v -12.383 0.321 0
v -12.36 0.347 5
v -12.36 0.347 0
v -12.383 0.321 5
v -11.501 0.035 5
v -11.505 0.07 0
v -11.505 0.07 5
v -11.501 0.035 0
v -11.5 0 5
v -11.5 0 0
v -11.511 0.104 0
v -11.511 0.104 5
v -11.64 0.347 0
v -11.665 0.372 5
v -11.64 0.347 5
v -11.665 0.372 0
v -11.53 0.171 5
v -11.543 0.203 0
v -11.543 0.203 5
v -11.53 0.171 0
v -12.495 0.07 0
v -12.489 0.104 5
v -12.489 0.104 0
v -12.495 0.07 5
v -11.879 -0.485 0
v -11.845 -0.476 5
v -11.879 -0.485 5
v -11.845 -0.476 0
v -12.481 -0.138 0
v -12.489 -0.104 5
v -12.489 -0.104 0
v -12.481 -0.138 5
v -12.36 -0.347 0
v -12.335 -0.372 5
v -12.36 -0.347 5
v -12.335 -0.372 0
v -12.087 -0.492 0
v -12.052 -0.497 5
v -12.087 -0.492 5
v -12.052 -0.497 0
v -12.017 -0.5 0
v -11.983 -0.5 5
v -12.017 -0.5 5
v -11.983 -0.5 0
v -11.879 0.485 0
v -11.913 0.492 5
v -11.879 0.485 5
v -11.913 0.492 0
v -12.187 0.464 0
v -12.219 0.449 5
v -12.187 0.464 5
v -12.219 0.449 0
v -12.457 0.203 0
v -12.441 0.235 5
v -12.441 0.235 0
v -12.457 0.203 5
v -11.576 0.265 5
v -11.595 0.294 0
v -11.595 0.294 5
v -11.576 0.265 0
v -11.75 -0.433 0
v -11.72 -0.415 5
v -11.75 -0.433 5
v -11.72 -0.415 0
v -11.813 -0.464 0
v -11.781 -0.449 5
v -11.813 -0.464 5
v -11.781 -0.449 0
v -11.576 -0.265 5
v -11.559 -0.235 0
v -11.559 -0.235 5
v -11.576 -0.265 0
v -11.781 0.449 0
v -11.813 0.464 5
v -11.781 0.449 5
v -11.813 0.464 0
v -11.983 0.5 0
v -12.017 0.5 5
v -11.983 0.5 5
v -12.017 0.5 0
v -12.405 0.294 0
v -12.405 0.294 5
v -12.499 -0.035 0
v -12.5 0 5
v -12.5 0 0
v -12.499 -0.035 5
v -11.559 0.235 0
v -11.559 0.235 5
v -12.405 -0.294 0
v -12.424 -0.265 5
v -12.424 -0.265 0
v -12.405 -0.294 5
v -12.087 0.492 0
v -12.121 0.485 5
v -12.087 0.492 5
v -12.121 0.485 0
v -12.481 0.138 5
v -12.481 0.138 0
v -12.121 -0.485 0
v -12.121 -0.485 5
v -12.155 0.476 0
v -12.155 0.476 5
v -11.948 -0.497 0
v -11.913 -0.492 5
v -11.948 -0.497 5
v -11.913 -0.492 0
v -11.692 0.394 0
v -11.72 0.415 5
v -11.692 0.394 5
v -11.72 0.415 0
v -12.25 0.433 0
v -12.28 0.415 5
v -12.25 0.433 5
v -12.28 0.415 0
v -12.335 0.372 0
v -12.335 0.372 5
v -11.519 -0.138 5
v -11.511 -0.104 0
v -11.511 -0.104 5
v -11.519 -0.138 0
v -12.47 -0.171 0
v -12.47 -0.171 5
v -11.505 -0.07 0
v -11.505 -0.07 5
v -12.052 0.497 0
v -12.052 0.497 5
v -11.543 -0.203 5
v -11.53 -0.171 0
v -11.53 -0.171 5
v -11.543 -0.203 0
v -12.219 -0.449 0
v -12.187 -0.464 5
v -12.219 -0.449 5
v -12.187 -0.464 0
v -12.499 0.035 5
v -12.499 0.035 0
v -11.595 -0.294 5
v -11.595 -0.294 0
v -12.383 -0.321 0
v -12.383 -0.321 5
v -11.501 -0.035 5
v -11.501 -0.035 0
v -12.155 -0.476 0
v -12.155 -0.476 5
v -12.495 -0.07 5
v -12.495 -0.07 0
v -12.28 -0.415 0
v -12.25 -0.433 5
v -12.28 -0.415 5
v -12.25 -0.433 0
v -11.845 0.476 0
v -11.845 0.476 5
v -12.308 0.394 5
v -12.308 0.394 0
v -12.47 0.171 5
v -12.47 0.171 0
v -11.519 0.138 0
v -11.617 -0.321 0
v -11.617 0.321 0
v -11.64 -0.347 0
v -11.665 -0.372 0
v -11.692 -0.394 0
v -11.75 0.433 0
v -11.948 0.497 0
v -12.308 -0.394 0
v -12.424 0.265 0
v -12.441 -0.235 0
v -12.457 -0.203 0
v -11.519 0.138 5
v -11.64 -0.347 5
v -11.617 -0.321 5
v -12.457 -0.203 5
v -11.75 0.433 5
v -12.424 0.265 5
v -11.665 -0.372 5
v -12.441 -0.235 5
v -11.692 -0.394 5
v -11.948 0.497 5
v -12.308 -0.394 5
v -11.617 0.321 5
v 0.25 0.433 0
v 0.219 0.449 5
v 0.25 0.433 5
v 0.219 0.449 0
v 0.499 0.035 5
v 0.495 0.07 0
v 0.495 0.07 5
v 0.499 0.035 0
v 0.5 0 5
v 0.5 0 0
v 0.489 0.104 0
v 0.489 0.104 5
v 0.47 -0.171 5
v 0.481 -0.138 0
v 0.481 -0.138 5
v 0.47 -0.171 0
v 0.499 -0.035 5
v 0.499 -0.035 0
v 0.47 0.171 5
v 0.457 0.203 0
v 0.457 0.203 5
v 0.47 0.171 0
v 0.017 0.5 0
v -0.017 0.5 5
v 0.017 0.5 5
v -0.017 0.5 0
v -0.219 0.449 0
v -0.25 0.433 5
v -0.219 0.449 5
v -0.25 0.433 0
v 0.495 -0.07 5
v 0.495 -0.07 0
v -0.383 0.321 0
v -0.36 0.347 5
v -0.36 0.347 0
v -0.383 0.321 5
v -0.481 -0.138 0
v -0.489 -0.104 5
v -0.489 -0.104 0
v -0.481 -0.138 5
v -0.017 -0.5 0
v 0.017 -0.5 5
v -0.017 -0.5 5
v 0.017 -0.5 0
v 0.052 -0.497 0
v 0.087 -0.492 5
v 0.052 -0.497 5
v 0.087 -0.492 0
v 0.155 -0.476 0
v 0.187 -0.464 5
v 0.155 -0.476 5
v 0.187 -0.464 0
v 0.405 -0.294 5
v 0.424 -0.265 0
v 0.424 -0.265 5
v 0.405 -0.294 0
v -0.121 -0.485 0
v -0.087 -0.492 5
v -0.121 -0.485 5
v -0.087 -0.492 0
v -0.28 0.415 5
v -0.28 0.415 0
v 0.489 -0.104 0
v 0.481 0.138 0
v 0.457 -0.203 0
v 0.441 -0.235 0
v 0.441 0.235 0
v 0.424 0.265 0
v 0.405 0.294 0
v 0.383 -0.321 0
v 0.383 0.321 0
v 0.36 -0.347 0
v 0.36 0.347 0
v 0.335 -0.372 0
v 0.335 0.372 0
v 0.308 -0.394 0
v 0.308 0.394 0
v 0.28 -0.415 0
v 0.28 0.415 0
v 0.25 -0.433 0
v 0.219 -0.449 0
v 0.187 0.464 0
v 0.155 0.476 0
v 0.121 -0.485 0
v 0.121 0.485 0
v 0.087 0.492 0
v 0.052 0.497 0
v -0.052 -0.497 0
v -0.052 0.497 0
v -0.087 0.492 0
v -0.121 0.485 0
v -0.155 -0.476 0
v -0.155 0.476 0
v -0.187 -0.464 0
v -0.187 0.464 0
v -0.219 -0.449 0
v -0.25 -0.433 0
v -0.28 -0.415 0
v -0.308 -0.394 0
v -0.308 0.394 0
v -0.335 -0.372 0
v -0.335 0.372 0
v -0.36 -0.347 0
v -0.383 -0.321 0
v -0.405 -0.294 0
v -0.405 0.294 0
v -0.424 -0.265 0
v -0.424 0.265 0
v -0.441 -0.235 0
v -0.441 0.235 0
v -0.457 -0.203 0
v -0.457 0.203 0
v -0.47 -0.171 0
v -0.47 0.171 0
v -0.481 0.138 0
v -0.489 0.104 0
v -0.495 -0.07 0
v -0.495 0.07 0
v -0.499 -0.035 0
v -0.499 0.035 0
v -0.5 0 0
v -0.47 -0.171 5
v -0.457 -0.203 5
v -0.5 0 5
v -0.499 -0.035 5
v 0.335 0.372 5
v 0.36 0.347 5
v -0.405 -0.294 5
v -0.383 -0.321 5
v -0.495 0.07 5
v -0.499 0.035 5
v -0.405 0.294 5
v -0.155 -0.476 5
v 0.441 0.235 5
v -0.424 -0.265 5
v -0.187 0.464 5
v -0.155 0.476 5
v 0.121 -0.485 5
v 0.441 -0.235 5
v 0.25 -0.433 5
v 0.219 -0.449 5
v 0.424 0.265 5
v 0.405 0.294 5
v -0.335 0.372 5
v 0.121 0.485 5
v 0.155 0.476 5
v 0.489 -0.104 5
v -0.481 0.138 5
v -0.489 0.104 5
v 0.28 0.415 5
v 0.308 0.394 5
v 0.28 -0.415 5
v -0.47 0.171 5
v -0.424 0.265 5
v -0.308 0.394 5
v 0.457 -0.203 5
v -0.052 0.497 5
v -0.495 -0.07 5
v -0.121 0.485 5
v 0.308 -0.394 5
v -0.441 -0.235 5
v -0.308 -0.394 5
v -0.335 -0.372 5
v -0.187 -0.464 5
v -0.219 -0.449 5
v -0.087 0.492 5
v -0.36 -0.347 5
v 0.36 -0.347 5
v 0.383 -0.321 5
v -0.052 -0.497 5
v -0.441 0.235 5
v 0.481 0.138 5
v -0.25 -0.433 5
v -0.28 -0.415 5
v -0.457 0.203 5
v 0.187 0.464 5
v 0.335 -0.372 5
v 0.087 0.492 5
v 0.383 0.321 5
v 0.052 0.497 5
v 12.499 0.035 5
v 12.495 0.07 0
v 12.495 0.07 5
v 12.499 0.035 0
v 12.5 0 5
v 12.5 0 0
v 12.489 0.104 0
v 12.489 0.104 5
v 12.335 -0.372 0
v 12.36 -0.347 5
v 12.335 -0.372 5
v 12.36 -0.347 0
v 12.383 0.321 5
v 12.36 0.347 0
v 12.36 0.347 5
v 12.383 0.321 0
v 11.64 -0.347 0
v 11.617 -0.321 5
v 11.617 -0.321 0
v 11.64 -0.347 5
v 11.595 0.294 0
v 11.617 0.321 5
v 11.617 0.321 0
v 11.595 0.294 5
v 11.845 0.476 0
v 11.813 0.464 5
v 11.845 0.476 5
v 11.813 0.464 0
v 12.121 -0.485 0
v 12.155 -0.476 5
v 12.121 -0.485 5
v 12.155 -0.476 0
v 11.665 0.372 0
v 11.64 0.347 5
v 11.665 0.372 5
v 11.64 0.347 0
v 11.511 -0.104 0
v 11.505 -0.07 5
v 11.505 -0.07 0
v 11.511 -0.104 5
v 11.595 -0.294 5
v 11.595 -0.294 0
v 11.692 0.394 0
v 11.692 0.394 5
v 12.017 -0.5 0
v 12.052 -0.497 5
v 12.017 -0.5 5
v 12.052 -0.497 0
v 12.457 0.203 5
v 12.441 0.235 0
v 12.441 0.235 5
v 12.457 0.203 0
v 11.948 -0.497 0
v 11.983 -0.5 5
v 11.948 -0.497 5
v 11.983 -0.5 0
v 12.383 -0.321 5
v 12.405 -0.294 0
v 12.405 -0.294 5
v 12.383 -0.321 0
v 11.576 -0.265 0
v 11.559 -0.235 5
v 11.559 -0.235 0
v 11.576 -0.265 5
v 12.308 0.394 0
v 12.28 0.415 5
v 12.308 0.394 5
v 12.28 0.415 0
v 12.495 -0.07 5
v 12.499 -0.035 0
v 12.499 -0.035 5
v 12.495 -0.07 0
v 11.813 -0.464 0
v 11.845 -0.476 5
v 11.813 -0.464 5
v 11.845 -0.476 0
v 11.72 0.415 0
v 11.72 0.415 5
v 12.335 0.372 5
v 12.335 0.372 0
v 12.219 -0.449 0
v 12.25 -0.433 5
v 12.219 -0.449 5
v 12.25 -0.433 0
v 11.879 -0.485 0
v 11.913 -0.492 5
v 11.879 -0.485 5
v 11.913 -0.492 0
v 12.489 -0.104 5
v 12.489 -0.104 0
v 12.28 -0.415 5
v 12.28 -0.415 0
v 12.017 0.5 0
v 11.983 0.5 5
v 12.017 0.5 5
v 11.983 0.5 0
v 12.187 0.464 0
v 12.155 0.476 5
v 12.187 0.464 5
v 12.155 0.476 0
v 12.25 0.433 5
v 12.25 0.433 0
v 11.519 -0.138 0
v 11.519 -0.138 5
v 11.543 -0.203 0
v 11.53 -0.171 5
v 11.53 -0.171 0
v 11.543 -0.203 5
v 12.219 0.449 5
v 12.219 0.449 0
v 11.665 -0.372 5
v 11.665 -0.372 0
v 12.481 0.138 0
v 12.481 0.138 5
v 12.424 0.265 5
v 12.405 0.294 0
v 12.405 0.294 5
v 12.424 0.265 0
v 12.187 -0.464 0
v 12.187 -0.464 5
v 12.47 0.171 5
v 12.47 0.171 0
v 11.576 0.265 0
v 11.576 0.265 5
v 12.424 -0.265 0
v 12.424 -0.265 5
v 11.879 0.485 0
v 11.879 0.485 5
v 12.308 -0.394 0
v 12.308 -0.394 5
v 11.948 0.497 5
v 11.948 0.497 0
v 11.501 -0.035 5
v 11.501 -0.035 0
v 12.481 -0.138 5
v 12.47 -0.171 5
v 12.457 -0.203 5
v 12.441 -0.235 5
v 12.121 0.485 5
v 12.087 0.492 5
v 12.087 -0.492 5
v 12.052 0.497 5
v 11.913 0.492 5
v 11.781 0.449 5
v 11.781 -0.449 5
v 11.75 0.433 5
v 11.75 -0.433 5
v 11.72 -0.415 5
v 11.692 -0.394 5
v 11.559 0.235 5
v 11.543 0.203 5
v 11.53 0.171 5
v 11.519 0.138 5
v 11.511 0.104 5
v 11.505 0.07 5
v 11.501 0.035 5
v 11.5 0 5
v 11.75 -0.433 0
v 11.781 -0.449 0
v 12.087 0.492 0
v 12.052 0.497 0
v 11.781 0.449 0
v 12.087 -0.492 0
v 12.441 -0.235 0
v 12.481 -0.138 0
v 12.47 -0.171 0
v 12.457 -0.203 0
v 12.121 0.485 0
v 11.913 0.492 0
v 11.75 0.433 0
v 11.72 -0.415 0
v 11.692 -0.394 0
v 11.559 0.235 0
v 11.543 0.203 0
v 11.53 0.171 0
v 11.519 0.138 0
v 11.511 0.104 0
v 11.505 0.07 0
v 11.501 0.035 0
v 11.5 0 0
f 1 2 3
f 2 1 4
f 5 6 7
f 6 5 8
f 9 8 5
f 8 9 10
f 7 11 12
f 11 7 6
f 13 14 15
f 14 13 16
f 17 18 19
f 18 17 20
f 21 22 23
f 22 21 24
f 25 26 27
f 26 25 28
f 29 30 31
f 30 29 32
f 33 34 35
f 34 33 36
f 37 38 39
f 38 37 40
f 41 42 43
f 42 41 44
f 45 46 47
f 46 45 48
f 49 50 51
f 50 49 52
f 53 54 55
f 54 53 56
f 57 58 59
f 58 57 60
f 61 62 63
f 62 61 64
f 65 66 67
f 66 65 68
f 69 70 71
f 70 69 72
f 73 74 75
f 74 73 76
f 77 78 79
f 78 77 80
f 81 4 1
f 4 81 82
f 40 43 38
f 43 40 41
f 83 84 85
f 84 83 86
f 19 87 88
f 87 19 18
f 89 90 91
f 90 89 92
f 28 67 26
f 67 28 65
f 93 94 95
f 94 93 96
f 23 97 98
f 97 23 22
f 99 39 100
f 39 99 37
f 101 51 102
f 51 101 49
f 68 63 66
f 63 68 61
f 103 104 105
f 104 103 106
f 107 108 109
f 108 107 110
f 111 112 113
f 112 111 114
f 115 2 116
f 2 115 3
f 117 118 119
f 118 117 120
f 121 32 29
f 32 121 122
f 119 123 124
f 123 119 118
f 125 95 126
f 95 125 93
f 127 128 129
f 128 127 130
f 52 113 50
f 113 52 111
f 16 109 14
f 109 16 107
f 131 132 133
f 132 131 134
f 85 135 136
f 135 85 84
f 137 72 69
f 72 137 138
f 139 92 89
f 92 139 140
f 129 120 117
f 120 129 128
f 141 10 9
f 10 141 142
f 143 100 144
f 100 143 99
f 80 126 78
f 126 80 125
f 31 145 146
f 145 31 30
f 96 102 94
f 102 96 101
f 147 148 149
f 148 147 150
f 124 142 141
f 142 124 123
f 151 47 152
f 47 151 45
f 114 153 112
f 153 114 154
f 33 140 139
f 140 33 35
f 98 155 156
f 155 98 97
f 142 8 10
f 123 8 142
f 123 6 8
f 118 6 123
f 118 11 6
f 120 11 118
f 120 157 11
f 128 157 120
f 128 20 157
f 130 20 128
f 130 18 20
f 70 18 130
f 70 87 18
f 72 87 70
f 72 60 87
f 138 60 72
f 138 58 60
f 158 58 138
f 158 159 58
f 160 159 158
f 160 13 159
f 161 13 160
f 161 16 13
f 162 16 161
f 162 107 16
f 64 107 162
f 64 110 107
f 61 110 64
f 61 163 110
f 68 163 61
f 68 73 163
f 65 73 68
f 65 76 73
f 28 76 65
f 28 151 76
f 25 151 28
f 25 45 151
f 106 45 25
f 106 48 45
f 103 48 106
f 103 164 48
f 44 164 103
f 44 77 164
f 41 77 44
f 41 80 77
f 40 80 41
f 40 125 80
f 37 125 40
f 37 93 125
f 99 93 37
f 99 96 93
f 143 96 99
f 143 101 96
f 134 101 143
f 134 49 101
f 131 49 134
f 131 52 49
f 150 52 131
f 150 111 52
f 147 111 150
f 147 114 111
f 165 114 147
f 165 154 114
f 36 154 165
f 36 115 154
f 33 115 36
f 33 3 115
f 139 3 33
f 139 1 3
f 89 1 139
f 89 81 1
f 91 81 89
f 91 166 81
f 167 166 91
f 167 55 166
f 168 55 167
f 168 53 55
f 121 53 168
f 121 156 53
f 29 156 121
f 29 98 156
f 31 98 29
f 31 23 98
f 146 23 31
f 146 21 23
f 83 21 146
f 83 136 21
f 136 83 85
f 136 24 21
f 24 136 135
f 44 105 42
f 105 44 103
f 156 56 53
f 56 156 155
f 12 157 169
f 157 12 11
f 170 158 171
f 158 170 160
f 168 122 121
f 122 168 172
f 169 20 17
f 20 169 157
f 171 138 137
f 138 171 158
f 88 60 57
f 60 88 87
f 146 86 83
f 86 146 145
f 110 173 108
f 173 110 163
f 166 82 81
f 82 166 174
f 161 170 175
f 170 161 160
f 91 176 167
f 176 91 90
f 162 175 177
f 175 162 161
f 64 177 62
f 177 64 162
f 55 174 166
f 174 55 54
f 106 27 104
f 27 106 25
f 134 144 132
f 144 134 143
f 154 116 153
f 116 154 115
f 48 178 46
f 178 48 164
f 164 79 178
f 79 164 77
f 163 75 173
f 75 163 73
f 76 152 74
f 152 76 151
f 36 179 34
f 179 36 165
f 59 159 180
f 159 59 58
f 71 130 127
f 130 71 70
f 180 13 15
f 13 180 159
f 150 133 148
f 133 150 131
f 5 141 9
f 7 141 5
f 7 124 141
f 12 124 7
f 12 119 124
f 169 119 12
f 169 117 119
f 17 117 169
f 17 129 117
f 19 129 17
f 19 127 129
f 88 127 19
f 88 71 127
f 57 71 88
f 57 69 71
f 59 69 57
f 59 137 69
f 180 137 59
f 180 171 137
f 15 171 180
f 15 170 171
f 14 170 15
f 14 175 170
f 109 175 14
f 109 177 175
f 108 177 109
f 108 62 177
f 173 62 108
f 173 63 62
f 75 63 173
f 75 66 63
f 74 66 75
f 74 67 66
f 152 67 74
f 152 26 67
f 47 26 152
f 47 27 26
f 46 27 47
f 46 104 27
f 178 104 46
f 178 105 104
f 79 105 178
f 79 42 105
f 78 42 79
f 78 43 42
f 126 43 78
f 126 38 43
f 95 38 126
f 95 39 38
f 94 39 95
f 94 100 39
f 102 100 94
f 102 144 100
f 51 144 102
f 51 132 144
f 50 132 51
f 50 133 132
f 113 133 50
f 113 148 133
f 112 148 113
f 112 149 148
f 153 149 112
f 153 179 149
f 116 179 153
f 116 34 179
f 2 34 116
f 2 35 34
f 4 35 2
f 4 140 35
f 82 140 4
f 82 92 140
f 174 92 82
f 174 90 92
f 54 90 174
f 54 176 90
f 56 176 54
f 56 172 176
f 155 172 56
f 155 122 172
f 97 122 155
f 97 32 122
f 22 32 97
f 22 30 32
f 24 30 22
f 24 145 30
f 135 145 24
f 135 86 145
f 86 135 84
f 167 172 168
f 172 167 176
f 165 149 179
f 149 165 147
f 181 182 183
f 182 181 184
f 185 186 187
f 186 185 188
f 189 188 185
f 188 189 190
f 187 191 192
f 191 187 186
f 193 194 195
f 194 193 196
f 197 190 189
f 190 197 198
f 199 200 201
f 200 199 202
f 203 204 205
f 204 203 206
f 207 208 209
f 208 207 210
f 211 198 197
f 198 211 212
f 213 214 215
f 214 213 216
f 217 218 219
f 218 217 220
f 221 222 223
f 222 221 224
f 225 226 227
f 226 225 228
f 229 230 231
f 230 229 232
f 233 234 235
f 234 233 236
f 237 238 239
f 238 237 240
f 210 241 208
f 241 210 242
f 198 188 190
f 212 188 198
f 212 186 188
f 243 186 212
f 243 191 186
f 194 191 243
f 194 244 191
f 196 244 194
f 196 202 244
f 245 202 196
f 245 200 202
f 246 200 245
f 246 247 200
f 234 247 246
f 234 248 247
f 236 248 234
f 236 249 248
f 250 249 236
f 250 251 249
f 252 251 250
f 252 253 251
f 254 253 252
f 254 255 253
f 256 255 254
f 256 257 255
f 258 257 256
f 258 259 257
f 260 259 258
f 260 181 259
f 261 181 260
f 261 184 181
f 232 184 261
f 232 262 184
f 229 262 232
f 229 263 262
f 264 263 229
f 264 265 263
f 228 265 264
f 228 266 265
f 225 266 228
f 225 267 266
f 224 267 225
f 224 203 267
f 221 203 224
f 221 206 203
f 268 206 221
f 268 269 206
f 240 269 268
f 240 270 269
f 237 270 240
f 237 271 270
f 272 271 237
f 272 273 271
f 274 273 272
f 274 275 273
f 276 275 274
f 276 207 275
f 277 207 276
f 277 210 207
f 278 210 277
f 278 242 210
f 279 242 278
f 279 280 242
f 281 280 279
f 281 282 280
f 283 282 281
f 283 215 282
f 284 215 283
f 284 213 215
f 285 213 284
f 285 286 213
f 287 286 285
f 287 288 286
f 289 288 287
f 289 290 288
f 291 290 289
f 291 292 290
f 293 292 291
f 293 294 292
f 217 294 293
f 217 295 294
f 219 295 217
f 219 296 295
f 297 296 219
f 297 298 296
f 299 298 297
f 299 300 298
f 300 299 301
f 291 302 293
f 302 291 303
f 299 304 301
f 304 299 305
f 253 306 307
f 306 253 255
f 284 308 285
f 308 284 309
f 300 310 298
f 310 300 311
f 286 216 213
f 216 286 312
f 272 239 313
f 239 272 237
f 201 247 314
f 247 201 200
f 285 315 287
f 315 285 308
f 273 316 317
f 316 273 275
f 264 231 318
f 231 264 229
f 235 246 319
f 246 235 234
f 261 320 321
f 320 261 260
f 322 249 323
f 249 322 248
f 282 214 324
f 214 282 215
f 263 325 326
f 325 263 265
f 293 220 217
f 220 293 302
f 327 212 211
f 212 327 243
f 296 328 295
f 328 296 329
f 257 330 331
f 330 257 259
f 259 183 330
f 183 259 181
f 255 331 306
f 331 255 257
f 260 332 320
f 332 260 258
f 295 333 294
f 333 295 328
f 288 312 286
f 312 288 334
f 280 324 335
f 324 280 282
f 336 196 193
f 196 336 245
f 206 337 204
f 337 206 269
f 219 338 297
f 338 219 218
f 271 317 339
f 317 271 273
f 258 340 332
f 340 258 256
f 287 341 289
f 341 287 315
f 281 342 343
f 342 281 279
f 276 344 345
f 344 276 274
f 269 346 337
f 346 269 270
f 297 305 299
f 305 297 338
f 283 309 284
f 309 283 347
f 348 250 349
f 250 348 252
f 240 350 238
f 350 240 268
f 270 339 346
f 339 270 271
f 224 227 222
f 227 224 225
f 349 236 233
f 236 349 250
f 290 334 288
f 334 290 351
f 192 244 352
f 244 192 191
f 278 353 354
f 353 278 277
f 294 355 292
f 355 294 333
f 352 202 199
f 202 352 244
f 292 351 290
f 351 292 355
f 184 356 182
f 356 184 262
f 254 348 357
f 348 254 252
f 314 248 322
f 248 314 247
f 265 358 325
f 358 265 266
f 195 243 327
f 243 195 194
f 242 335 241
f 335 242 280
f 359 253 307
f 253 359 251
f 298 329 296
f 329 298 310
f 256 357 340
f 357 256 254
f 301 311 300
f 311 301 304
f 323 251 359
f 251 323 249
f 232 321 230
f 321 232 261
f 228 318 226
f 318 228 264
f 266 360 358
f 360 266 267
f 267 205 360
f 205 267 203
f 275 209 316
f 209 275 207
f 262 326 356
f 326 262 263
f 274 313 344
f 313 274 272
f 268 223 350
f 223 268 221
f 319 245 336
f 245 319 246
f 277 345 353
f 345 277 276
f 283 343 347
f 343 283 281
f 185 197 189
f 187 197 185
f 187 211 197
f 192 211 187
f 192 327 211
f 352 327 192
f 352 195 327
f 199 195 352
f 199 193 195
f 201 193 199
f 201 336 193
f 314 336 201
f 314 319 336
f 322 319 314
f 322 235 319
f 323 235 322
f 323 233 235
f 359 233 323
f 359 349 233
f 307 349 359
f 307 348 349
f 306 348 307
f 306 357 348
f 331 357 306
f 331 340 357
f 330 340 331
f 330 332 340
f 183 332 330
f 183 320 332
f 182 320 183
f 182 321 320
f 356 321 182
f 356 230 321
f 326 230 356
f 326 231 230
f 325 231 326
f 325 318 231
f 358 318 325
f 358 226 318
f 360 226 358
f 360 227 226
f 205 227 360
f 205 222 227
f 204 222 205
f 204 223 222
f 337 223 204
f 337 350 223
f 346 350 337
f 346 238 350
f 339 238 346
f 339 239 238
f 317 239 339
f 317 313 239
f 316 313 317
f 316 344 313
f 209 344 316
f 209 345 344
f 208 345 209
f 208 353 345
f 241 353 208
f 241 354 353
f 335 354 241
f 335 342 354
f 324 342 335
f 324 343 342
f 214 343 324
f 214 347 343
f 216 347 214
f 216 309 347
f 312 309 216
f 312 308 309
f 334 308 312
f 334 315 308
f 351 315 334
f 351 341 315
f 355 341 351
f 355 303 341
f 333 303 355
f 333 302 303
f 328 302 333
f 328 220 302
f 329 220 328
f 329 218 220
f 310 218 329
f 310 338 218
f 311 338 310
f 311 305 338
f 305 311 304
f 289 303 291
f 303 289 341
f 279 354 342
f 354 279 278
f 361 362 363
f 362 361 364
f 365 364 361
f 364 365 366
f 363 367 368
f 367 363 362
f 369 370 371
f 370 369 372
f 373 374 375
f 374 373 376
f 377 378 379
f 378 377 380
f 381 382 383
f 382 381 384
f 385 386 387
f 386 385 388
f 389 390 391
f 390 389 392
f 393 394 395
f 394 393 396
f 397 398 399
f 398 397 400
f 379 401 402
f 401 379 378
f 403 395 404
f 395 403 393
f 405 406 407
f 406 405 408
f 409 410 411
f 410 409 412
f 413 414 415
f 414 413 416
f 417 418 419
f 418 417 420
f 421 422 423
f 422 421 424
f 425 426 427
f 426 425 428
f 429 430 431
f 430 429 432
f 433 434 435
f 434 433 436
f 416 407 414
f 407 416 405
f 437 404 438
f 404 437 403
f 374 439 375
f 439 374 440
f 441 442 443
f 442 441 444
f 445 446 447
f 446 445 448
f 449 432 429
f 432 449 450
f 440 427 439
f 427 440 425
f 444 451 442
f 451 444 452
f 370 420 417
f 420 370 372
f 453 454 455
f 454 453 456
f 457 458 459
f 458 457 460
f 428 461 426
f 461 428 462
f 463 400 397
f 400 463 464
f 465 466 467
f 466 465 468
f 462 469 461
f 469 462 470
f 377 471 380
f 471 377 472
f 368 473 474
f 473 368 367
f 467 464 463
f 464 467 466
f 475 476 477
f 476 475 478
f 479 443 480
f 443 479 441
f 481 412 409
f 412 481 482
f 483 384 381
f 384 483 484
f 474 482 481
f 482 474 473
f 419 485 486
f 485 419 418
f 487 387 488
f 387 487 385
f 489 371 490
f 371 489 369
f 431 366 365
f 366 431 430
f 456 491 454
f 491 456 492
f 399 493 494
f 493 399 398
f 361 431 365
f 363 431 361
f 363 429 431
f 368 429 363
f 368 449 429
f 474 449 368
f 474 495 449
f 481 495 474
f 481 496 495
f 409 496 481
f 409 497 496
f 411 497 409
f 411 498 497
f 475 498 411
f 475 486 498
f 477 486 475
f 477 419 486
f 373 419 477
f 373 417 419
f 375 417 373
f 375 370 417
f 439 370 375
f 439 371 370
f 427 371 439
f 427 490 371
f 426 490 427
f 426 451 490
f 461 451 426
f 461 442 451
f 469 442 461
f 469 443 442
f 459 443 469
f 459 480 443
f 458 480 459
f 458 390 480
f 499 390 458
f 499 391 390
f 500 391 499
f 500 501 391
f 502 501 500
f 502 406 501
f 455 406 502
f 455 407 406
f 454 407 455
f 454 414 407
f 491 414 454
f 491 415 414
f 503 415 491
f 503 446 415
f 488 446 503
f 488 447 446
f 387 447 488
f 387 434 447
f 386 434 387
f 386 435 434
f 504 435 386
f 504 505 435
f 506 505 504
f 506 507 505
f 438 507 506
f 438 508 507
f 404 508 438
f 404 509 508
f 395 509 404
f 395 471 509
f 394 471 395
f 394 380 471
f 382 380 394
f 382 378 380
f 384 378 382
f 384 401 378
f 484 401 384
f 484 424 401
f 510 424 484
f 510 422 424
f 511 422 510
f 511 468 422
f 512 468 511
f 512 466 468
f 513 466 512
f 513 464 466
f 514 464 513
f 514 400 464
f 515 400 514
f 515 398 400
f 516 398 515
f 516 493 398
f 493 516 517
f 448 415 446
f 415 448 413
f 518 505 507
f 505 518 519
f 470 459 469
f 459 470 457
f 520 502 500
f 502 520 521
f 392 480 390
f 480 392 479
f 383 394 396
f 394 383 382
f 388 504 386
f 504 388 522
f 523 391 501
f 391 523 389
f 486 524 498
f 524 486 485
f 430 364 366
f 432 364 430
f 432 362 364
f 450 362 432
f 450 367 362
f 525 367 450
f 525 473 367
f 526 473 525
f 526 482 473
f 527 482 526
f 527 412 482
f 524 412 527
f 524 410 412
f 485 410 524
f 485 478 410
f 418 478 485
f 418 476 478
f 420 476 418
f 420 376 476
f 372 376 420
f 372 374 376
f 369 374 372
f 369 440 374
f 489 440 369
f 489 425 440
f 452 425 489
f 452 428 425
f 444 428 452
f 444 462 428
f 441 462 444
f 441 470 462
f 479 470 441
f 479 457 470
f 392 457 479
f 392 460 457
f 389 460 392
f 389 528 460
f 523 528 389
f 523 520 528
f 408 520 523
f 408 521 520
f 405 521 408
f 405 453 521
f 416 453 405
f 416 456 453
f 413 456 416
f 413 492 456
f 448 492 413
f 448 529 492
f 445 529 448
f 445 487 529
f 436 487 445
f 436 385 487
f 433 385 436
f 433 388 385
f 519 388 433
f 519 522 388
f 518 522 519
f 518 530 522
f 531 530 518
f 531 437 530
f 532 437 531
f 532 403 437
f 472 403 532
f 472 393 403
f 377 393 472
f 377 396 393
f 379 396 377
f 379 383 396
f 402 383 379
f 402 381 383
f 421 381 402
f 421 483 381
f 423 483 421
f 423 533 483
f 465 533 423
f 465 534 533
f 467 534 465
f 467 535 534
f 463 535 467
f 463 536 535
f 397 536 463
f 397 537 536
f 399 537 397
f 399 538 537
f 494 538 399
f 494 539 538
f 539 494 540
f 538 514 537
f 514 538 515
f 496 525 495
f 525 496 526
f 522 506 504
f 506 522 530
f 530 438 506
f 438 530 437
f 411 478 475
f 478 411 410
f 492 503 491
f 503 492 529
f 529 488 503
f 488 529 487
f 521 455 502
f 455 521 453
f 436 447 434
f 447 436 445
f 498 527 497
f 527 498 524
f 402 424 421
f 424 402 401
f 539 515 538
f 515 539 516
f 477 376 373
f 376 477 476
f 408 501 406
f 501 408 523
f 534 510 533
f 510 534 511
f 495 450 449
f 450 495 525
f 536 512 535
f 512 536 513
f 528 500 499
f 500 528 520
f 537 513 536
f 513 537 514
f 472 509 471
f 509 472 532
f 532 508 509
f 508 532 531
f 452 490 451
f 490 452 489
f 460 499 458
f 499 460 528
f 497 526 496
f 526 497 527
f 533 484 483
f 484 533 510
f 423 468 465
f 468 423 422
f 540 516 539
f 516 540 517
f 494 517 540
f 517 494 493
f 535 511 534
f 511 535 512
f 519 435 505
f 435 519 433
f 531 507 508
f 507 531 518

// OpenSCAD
$fn = 90;

/*

HEXAGON:
d = diameter (afstand overstaande hoeken)
b = breedte (afstand overstaande zijden)
z = zijde (lengte van een zijde)

d
    b = 0.5 * sqrt(3) * d
    z = 0.5 * d
b
    d = b / ( 0.5 * sqrt(3) )
    z = b / sqrt(3)
z
    d = 2 * z
    b = sqrt(3) * z

*/

module hexagon( 
    d = -1,
    b = -1,
    z = -1
) {
    if ( d > 0 ) {
        polygon( [
            [ 0.5 * d, 0 ],
            [ 0.5 * d / 2, 0.5 * sqrt(3) * d / 2 ],
            [ -0.5 * d / 2, 0.5 * sqrt(3) * d / 2 ],
            [ -0.5 * d, 0 ],
            [ -0.5 * d / 2, -0.5 * sqrt(3) * d / 2 ],
            [ 0.5 * d / 2, -0.5 * sqrt(3) * d / 2 ],
        ] );
    }
    if ( b > 0 ) {
        polygon( [
            [ b / ( 0.5 * sqrt(3) ) / 2, 0 ],
            [ b / sqrt(3) / 2, b / 2 ],
            [ -b / sqrt(3) / 2, b / 2 ],
            [ -b / ( 0.5 * sqrt(3) ) / 2, 0 ],
            [ -b / sqrt(3) / 2, -b / 2 ],
            [ b / sqrt(3) / 2, -b / 2 ],
        ] );
    }
    if ( z > 0 ) {
        polygon( [
            [ z, 0 ],
            [ z / 2, z * sqrt(3) / 2 ],
            [ -z / 2, z * sqrt(3) / 2 ],
            [ -z, 0 ],
            [ -z / 2, -z * sqrt(3) / 2 ],
            [ z / 2, -z * sqrt(3) / 2 ],
        ] );
    }
}

translate( [ -12, 0 ] ) {
    color( "Red" ) cylinder( d = 1, h = 5 );
    hexagon( d = 10 );
}

color( "Red" ) cylinder( d = 1, h = 5 );
hexagon( b = 8 );

translate( [ 12, 0 ] ) {
    color( "Red" ) cylinder( d = 1, h = 5 );
    hexagon( z = 5 );
}


/*

ROUNDED_HEXAGON:
d = diameter (afstand overstaande hoeken)
b = breedte (afstand overstaande zijden)
z = zijde (lengte van een zijde)
r = radius (radius van de hoek)

D = d - r
B = b - r

b, d -> r:

    r = b - 0.5 * sqrt(3) * (d - r)

    r = b - 0.5 * sqrt(3) * d - 0.5 * sqrt(3) * r

    r + 0.5*sqrt(3) * r = b - ( 0.5*sqrt(3)*d)
    ( 1 + 0.5*sqrt(3)) * r = b - ( 0.5*sqrt(3)*d)
         ( b - ( 0.5 * sqrt(3) * d )
    r = ------------------------------
          ( 1 + ( 0.5 * sqrt(3) )

               ____
   /|         |    | |\
1 / | sin60   |    | | \ 1
 /__|         |____| |__\
  cos60        1       c60
  
 cos(60) = 0.5
 sin(60) = sqrt(3) / 2
 
z = d / 2;
 
d = z * cos(60) + z + z * cos(60) = z * (.5 + 1 + .5) = z * 2
b = z * sin(60) * 2 
  = z * sqrt(3) / 2 * 2 
  = z * sqrt(3)
  = d  * .5 * sqrt(3)


z = b / sqrt(3)
d = z * 2 = 2 * b * 1/sqrt(3)

B = b + r; b = B - r
D = d + r;
r?
d = D - r;
r = B - b;

r = B - ( d * .5 * sqrt(3) )
  = B - ( ( D - r ) * .5 * sqrt(3) )
  = B - ( D * .5 * sqrt(3) ) - ( r * .5 * sqrt(3) ) 
r + ( r * .5 * sqrt(3) ) = B - ( D * .5 * sqrt(3) )

r * ( 1 + ( .5 * sqrt(3) ) = B - ( D * .5 * sqrt(3) )


 
 
*/
